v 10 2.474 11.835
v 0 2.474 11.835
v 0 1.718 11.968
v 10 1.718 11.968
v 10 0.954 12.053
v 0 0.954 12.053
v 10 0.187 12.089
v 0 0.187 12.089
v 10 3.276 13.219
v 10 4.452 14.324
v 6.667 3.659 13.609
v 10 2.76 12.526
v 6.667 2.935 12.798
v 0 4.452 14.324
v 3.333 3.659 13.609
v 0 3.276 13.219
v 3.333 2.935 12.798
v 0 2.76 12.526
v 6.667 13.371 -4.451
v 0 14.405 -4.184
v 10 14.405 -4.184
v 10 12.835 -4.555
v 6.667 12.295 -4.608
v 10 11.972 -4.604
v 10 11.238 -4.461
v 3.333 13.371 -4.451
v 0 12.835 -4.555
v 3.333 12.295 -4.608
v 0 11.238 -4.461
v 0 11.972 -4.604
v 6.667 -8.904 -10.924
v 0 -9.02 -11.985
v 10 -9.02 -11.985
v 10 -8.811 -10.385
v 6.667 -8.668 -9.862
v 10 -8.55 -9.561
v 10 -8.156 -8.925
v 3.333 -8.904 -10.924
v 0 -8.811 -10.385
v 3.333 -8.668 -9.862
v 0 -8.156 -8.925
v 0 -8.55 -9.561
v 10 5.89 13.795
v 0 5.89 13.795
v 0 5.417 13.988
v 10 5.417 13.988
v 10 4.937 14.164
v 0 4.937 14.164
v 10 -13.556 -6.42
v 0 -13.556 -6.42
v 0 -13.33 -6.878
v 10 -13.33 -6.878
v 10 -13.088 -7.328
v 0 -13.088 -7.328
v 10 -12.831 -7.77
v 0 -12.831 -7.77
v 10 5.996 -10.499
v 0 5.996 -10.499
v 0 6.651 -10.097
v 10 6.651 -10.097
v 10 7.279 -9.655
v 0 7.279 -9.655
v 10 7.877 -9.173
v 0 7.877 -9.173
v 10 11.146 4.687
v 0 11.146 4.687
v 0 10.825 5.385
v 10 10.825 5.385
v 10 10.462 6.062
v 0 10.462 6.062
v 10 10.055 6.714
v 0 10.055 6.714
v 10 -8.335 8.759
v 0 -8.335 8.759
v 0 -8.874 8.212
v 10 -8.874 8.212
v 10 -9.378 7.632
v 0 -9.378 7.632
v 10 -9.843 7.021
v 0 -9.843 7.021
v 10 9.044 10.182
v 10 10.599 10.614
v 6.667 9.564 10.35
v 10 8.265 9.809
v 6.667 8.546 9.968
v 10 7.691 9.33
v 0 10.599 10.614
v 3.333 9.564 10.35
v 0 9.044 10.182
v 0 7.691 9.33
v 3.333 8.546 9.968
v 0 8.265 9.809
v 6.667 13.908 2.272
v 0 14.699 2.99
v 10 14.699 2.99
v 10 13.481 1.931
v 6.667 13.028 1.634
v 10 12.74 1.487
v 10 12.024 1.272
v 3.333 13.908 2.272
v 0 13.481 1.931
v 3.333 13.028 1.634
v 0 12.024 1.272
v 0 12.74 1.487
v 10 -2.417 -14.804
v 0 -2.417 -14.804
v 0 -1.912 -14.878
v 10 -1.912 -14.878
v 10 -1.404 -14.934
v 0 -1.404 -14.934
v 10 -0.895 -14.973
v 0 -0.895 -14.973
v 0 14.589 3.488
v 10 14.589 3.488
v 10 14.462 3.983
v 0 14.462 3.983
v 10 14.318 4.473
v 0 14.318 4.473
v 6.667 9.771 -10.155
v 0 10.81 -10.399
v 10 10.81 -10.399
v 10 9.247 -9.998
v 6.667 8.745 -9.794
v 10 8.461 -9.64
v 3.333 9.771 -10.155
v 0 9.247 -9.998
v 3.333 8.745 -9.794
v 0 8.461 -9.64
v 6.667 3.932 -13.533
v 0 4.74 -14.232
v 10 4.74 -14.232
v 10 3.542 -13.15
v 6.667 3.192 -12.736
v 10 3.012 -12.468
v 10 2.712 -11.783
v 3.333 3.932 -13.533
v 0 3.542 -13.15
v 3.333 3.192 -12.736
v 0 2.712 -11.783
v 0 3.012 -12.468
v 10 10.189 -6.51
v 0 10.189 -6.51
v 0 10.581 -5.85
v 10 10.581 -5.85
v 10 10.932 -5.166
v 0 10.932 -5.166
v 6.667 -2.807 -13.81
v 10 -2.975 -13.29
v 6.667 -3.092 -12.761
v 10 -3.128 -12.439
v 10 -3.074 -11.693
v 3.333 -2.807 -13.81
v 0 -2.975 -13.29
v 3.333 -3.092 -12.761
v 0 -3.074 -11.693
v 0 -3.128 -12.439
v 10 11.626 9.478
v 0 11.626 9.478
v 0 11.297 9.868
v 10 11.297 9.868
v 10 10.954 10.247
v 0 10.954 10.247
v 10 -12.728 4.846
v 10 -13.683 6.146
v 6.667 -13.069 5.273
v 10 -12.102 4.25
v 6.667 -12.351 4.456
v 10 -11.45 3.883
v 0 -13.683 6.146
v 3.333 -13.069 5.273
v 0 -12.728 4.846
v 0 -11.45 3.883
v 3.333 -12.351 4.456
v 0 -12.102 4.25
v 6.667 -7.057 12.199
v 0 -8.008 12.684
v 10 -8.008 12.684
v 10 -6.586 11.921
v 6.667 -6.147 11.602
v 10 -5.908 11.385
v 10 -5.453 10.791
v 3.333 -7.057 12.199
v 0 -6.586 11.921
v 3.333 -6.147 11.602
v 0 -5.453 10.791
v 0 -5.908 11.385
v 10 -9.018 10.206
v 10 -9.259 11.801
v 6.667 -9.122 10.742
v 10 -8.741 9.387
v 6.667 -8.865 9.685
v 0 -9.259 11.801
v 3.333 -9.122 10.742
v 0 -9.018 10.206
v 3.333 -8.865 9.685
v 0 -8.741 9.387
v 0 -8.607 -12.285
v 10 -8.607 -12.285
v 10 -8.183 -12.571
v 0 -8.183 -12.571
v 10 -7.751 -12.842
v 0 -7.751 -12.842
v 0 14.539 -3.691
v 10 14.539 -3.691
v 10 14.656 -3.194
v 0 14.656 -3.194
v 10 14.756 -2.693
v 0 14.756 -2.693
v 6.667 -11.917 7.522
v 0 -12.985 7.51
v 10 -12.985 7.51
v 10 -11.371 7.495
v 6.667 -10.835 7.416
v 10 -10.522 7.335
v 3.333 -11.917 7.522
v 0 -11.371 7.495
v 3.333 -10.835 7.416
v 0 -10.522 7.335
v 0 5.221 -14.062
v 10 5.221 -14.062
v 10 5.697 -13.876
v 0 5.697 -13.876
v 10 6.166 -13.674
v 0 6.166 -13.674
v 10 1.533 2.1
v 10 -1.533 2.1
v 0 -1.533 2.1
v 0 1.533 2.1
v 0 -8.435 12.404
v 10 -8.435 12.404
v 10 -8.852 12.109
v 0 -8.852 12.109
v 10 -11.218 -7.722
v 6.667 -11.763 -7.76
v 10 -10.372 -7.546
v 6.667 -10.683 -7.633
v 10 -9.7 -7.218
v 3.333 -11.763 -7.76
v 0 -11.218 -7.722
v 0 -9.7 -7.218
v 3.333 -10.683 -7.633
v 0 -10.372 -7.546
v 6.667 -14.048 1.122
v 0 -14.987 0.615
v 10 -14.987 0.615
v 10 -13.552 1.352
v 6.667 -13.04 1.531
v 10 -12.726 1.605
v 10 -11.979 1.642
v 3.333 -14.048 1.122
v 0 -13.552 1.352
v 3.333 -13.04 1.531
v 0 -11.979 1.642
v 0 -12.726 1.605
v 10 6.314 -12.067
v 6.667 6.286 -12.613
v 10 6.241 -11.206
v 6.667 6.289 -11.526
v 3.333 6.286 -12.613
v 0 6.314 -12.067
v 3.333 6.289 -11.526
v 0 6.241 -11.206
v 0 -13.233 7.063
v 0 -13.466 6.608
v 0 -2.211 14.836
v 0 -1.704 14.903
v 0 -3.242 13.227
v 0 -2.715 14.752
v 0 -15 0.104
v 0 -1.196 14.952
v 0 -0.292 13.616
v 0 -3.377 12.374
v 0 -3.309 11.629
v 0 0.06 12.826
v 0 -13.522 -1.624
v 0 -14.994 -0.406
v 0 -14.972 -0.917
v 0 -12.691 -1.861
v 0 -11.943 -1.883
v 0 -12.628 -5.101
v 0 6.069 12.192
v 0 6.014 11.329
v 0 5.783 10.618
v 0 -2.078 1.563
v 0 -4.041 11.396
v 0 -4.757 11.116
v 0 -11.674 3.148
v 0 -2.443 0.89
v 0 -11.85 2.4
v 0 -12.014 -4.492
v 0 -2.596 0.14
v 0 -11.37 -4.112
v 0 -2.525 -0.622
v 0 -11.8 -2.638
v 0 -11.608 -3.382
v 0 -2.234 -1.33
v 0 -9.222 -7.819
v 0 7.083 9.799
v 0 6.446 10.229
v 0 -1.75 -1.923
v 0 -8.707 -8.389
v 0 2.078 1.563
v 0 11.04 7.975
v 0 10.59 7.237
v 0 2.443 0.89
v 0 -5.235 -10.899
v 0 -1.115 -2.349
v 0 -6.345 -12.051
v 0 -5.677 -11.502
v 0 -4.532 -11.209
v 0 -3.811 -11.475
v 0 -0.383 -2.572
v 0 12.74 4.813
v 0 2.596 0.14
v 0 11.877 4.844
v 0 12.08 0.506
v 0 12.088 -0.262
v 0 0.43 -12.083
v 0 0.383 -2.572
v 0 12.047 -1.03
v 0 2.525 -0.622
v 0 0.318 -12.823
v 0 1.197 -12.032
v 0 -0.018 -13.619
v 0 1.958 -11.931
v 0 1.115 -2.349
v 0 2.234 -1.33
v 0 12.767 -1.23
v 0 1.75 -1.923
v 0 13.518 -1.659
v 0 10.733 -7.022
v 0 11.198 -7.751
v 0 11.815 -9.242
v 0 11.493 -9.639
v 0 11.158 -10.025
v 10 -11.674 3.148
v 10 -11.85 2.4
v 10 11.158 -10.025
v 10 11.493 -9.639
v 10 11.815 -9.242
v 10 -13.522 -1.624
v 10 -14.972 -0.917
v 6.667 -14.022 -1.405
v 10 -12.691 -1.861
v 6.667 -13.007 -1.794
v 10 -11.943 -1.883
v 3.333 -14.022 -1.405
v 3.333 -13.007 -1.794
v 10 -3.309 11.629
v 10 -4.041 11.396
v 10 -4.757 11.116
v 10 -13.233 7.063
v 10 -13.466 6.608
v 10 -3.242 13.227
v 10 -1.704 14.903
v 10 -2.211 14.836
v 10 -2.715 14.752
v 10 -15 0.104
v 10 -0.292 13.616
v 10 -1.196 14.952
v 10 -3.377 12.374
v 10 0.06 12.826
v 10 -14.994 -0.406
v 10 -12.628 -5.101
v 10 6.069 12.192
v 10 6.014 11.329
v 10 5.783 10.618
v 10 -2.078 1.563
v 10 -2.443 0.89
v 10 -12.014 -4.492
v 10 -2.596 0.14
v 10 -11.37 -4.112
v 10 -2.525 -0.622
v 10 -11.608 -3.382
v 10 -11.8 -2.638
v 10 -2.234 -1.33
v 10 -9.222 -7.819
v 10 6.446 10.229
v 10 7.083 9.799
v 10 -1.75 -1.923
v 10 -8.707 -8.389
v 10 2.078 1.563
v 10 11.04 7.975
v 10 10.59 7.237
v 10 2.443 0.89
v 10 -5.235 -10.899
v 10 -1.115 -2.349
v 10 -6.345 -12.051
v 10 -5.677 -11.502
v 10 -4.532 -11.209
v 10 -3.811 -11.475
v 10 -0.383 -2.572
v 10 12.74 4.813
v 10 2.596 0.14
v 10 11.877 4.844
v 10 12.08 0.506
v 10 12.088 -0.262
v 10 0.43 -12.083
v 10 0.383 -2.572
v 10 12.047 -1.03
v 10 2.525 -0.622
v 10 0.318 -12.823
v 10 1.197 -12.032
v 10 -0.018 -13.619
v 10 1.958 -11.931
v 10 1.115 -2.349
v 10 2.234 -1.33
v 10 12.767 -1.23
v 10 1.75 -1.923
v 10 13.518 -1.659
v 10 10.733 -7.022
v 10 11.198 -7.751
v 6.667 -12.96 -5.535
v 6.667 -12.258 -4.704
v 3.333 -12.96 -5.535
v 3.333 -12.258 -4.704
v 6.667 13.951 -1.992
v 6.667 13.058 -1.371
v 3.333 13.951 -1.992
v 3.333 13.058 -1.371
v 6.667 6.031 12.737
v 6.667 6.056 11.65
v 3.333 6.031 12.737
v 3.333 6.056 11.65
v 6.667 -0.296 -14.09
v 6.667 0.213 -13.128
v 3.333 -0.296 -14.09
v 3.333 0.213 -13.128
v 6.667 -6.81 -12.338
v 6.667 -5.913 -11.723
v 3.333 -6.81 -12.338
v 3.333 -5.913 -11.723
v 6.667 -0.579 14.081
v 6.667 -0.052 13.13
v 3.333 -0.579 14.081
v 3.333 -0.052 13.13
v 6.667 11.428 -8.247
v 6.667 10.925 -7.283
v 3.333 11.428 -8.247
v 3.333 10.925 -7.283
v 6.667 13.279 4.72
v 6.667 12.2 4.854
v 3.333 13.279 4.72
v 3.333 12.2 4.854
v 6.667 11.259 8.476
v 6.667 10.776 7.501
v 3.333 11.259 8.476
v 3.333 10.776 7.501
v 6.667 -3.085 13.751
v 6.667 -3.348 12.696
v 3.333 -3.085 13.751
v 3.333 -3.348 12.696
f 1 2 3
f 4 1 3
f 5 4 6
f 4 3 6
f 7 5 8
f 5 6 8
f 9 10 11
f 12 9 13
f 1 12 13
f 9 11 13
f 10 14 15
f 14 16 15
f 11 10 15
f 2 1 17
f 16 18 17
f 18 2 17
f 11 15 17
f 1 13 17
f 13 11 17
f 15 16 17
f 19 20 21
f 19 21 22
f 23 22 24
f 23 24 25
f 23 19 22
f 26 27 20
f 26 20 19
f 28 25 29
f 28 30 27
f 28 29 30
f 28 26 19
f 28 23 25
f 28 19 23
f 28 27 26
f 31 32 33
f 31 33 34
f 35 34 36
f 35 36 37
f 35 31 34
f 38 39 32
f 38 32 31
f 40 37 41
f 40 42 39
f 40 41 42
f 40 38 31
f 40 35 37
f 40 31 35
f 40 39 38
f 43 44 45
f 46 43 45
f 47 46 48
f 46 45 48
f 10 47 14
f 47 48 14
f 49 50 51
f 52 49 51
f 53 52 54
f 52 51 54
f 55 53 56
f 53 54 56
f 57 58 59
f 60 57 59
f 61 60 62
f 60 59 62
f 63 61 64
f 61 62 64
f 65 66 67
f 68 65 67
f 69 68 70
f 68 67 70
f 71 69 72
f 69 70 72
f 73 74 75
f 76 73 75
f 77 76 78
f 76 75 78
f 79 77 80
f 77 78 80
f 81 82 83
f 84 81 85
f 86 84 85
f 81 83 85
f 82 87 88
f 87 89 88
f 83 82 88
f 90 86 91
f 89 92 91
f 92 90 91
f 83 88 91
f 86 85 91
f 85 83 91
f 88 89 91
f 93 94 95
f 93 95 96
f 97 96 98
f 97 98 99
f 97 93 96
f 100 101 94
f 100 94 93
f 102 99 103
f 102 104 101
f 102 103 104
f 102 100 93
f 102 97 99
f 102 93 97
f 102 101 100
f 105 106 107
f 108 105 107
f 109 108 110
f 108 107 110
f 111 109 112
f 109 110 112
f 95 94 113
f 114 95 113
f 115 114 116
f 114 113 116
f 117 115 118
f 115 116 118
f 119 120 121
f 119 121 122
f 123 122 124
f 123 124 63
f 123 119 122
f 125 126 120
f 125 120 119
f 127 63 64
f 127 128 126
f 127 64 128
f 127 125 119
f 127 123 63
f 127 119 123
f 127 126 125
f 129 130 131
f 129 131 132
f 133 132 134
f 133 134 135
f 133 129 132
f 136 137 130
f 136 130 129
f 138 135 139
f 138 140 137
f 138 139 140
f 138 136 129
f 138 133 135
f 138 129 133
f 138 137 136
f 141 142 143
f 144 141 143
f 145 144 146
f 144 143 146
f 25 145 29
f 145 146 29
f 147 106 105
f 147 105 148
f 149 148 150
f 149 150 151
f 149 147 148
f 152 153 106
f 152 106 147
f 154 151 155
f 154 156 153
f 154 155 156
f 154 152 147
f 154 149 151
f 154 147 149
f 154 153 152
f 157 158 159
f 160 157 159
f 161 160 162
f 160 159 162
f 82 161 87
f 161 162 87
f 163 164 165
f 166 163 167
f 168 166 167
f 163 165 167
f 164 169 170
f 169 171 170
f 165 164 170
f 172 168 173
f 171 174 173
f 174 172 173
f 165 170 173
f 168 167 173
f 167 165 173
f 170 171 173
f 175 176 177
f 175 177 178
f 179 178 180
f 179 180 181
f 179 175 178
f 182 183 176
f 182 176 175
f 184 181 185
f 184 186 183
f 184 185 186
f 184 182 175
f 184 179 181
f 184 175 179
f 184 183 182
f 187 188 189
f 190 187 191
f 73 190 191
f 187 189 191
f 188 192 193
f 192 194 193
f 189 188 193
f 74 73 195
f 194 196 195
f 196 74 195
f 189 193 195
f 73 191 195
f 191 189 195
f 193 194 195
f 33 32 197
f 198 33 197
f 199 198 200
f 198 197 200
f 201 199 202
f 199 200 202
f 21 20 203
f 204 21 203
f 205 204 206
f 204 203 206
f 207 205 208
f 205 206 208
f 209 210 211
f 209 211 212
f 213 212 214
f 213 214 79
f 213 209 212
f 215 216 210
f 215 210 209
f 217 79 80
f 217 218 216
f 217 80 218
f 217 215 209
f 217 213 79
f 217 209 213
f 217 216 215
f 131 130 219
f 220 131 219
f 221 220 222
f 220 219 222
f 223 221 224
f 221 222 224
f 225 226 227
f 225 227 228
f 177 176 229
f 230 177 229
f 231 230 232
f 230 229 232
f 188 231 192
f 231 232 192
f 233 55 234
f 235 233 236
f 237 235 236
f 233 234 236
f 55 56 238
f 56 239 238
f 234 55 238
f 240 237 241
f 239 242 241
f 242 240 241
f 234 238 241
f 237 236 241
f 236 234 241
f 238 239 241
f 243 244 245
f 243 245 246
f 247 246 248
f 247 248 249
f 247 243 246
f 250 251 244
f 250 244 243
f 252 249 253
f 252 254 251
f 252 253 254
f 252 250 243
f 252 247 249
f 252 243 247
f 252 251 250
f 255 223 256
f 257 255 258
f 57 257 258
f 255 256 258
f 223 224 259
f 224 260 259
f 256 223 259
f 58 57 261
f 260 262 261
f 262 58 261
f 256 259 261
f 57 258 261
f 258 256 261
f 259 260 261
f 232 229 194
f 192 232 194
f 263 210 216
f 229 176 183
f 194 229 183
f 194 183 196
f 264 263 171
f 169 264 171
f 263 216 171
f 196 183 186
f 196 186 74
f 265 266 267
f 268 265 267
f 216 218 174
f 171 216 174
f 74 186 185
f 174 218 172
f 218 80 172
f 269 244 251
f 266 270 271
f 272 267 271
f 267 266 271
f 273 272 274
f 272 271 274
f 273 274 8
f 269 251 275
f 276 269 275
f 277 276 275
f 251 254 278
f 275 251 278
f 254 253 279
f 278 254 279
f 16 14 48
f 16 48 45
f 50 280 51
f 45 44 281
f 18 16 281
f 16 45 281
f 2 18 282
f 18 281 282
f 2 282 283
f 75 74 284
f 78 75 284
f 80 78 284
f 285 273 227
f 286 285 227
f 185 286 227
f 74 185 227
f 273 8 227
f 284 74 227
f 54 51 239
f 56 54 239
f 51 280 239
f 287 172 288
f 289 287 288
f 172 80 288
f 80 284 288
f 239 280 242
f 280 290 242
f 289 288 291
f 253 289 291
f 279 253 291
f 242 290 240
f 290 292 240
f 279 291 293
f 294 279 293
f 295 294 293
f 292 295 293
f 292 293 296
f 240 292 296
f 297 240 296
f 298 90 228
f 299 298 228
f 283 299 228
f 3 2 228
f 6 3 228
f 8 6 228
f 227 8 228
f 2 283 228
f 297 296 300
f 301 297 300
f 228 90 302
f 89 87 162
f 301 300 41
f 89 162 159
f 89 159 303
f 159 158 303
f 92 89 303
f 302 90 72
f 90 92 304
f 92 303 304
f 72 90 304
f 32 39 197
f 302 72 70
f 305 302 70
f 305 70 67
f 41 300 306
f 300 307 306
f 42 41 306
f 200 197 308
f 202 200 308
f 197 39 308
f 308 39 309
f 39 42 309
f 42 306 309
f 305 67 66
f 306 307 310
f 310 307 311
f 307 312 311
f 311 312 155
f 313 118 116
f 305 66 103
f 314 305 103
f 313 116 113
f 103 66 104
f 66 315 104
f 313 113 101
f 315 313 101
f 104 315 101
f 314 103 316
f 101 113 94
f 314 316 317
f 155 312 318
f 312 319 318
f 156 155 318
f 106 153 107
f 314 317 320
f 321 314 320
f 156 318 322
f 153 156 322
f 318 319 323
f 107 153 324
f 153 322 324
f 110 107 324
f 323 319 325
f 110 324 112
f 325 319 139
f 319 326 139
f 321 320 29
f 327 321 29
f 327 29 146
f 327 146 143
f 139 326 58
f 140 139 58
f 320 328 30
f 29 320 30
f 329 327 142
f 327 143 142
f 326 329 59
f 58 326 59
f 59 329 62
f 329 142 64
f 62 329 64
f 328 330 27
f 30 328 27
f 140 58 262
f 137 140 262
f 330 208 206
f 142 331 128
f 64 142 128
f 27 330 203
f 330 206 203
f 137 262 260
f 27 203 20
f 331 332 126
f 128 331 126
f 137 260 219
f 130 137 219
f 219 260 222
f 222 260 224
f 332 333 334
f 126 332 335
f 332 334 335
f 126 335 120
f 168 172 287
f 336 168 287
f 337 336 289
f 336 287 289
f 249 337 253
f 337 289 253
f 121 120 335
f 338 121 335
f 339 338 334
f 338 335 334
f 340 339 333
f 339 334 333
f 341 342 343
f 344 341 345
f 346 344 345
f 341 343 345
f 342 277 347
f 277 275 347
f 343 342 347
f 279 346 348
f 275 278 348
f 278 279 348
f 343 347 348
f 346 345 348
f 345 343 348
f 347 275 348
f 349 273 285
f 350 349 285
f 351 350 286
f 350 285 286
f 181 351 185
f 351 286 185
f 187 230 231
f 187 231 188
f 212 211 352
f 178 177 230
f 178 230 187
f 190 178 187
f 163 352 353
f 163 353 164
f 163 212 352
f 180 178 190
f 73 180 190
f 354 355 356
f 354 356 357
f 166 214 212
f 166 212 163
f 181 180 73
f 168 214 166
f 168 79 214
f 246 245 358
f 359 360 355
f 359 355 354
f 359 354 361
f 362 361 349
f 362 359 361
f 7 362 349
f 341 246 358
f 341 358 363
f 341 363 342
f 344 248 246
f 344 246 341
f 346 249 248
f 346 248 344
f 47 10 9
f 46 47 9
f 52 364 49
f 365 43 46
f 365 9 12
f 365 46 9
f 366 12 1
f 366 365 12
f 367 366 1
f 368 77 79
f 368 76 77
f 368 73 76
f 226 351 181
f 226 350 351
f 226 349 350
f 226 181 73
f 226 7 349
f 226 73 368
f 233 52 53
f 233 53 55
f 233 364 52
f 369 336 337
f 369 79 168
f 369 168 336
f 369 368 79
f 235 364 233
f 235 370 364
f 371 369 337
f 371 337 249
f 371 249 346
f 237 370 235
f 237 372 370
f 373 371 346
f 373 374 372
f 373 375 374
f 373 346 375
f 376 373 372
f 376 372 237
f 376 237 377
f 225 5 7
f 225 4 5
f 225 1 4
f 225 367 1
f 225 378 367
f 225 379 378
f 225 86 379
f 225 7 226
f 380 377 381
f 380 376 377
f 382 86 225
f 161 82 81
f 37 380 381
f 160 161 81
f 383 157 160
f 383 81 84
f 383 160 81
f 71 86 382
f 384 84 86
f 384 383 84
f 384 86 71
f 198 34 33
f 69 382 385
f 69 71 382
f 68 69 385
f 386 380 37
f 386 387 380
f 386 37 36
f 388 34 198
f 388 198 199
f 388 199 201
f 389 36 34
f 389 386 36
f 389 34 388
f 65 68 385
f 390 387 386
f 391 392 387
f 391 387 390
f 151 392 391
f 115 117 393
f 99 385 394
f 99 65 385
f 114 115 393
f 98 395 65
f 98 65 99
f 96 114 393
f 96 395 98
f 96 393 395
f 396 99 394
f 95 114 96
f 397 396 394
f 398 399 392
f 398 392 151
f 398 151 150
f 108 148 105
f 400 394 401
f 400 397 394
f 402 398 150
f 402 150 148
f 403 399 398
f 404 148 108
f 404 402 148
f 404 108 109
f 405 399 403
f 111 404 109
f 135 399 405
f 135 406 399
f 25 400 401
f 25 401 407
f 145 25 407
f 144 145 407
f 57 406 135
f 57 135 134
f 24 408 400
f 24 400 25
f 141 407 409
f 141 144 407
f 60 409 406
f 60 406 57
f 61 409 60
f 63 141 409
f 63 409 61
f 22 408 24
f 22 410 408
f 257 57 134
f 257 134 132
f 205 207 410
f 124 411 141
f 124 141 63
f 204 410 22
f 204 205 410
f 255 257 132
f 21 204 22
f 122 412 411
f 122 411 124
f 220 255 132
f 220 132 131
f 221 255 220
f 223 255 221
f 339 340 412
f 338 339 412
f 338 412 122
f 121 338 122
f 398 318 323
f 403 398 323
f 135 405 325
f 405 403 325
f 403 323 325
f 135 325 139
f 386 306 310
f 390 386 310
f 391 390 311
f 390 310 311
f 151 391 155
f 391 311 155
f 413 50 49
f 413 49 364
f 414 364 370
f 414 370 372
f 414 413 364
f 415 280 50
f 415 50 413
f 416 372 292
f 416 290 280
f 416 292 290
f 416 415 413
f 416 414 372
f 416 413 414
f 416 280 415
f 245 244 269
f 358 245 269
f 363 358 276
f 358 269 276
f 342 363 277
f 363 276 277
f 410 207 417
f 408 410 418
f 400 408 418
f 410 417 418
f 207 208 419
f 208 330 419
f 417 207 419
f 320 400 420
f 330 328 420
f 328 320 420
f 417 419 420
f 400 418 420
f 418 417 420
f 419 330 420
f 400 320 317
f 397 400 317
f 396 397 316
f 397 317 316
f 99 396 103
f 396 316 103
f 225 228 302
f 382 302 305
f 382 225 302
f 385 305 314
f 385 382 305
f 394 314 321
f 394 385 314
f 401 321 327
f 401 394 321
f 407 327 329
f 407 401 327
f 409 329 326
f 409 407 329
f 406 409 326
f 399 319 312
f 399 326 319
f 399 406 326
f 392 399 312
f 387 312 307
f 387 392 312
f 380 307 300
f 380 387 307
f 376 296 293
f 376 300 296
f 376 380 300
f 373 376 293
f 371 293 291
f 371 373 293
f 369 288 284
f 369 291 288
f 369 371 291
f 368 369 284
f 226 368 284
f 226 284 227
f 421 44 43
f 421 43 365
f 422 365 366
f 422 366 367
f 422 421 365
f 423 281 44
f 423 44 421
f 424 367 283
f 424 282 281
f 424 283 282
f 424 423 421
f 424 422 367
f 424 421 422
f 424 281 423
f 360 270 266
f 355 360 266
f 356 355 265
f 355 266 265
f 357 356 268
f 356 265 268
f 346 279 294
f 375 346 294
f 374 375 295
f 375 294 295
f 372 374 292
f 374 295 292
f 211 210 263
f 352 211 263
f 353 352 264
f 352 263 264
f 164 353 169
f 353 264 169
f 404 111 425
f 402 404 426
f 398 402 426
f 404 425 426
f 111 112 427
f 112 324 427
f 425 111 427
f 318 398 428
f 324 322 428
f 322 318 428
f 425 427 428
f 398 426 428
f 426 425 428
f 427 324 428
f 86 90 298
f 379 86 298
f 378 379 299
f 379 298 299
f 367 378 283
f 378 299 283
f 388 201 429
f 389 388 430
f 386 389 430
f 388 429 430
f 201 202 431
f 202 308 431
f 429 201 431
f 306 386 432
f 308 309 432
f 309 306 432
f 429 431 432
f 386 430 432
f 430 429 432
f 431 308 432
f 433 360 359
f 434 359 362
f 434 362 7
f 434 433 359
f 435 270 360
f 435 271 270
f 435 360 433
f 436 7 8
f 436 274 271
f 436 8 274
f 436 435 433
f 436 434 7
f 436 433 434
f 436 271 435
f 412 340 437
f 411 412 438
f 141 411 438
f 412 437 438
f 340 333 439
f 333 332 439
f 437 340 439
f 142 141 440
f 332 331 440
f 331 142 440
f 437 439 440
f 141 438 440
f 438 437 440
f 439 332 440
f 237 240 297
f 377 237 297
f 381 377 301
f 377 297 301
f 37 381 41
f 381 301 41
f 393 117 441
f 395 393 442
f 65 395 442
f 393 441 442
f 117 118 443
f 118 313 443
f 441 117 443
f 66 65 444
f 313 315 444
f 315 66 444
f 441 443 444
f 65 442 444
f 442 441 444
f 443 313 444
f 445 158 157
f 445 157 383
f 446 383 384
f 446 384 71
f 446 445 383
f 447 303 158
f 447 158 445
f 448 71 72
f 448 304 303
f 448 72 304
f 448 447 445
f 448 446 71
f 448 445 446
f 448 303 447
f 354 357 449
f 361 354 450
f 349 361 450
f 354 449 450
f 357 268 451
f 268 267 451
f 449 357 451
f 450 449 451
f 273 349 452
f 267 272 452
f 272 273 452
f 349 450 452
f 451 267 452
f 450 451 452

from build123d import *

# Parameters (mm, degrees)
SKETCH3_R           = 12.090863095
BOSS_EXTRUDE1_DEPTH = 10
BOSS_EXTRUDE2_DEPTH = 10
CIRPATTERN1_COUNT   = 13
CUT_EXTRUDE1_DEPTH  = 24.435008607


with BuildPart() as part:
    # Sketch3 → Boss-Extrude1 (new body)
    with BuildSketch(Plane.YZ):
        with Locations(Location((0, 0, 0), (0, 0, 270))):
            Circle(SKETCH3_R)
    extrude(amount=BOSS_EXTRUDE1_DEPTH)

    # Sketch4 → Boss-Extrude2 (add)
    with BuildSketch(Plane.YZ):
        with BuildLine():
            ThreePointArc((-1.195976025, 14.952245361), (-1.957892883, 14.871672921), (-2.714701737, 14.752301328))
            add(Edge.make_bspline(
                [(-2.714701737, 14.752301328), (-3.072545731, 13.791794486), (-3.565367762, 12.687541268), (-3.309213228, 11.62919078)],
                knots=[0.053106957, 0.053106957, 0.053106957, 0.053106957, 1.037972429, 1.037972429, 1.037972429, 1.037972429], degree=3))
            ThreePointArc((-3.309213228, 11.62919078), (-1.57817432, 11.987424085), (0.186598469, 12.089423121))
            add(Edge.make_bspline(
                [(-1.195976025, 14.952245361), (-0.601727805, 14.117083837), (0.160103486, 13.178008863), (0.186598469, 12.089423121)],
                knots=[0.053106957, 0.053106957, 0.053106957, 0.053106957, 1.037972429, 1.037972429, 1.037972429, 1.037972429], degree=3))
        make_face()
    boss_extrude2 = extrude(amount=BOSS_EXTRUDE2_DEPTH)

    # CirPattern1: Boss-Extrude2 ×13 about axis
    cirpattern1_axis = Axis((10, 0, 0), (1, 0, 0))
    for i in range(1, CIRPATTERN1_COUNT):
        add(boss_extrude2.rotate(cirpattern1_axis, i * 360 / CIRPATTERN1_COUNT))

    # Sketch5 → Cut-Extrude1 (cut, through all)
    with BuildSketch(Plane.YZ.offset(10)):
        with BuildLine():
            Line((-1.532970972, 2.1), (1.532970972, 2.1))
            ThreePointArc((1.532970972, 2.1), (0, -2.6), (-1.532970972, 2.1))
        make_face()
    extrude(amount=-CUT_EXTRUDE1_DEPTH, mode=Mode.SUBTRACT)


solid = part.part
